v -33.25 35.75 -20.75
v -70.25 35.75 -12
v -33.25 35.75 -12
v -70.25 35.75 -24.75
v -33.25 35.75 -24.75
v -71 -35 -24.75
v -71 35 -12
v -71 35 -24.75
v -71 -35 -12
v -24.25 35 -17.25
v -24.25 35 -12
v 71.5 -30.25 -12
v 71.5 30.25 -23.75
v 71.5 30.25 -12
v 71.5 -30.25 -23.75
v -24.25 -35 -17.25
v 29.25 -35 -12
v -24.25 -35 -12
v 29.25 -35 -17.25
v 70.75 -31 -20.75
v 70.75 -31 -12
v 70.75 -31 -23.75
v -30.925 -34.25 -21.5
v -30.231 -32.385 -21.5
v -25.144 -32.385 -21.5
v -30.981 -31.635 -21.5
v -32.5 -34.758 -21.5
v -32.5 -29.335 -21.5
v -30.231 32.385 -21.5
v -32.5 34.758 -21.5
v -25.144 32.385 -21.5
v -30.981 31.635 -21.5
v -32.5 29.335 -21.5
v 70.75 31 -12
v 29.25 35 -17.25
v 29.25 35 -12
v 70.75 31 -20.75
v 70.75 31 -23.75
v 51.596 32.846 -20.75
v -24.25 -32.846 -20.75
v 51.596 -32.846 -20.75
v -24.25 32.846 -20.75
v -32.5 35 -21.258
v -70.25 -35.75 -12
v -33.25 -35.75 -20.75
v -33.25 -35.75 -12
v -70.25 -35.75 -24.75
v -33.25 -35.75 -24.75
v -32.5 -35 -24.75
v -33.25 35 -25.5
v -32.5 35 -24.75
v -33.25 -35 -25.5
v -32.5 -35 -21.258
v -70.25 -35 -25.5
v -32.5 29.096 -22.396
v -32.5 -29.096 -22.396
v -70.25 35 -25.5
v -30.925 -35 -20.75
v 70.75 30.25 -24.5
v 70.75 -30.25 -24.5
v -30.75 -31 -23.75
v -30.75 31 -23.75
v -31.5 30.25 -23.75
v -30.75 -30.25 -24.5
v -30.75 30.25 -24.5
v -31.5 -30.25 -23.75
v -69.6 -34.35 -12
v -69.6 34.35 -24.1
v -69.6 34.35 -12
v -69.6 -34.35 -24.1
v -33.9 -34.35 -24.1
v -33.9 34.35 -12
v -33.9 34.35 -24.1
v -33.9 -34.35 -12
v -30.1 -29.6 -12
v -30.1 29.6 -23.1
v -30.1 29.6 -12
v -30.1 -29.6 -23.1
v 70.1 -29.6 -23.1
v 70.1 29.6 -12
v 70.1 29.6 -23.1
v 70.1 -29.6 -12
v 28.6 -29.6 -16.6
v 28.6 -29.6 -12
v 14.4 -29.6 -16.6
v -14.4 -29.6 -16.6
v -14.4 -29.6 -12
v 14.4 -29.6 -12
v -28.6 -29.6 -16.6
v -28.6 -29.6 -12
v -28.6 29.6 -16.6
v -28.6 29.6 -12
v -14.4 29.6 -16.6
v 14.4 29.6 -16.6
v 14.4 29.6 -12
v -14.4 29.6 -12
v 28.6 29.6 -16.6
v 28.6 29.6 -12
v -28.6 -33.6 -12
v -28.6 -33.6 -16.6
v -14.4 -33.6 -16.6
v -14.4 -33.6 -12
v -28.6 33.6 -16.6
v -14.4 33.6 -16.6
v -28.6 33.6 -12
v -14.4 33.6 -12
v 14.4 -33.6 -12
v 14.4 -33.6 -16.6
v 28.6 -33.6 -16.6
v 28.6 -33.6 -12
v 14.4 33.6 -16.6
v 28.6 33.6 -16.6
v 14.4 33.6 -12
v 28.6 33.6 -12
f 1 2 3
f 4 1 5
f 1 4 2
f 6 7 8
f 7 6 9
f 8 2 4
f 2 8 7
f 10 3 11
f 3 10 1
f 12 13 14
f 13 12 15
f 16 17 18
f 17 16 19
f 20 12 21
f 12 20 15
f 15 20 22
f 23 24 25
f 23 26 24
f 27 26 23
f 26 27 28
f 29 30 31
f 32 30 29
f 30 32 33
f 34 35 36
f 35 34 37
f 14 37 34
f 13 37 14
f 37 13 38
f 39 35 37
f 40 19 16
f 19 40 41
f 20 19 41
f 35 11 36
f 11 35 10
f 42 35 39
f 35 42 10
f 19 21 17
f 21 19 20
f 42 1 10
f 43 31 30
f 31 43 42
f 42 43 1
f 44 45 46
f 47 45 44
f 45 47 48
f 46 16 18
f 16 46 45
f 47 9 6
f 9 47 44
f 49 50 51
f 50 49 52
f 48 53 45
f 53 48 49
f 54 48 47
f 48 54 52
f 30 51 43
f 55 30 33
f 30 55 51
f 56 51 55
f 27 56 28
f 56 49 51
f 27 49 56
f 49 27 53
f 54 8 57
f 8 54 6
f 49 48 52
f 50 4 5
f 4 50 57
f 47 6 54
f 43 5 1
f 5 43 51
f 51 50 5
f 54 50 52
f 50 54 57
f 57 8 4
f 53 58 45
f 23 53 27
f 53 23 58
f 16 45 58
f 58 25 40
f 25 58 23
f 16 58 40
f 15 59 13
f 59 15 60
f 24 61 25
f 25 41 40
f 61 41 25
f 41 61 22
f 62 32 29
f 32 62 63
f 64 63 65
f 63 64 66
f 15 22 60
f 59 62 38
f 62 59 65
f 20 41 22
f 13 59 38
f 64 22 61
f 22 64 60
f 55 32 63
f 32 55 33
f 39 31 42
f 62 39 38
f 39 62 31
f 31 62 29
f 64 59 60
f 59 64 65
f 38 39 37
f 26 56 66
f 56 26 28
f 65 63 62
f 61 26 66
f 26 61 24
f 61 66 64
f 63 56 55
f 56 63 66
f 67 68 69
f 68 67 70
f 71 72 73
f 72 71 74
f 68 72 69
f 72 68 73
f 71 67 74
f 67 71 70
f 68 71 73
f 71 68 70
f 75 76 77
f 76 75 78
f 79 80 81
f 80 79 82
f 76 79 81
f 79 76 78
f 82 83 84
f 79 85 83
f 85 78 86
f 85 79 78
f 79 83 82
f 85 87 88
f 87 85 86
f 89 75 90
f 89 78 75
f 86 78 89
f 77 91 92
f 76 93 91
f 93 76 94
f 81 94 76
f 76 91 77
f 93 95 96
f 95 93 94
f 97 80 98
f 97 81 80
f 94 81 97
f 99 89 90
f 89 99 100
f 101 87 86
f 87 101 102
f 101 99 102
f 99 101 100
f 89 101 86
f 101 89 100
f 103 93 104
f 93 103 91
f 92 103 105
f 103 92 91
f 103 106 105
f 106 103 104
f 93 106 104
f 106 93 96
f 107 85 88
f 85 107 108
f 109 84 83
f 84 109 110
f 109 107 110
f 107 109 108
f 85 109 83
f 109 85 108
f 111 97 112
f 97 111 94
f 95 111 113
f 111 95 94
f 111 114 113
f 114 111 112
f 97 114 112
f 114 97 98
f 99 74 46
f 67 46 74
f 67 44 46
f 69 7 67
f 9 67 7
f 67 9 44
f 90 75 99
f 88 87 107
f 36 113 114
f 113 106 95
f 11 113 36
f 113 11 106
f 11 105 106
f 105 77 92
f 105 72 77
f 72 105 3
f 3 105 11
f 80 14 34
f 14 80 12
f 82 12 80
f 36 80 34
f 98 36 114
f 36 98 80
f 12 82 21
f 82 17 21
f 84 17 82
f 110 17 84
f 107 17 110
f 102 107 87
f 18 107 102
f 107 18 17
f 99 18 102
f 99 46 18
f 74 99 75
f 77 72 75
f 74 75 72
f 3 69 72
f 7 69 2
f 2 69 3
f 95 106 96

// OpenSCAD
$fs=1;
$fa=1;


display_w=85.5+.5;
display_h=28.5+.5;
display_h_2=33;

border=10;
w=display_w+2*10;
l=display_h+2*10+2*14;

mainboard_w=100;
mainboard_l=59;
mainboard_h=11;
mainboard_x=20;

wall=1.5;

// TODO bei dieser Höhe muss Akku / Mainboard neben den UI-Einheiten liegen?
h=15;

encoder_d=7;

module aa_box()
{
	translate([-35.5/2,0,-22.5/2]) cube([35.5,68.5,22.5],center=true);
}

module aa_cell()
{
	rotate(90,[1,0,0]) color([.3,.3,.7]){
		cylinder(h=49,r=14/2,center=true);
		translate([0,0,-49/2-1/2]) cylinder(h=1,r=2,center=true);
	}
}

module bevel_cube(size,bevel)
{
	hull()
	{
		cube(size-[0,bevel,bevel],center=true);
		cube(size-[bevel,bevel,0],center=true);
		cube(size-[bevel,0,bevel],center=true);
	}
}

module mainboard(inner=true)
{
	translate([mainboard_x,0,-mainboard_h/2]) color([.7,.3,0]) cube([mainboard_w,mainboard_l,mainboard_h],center=true);

	translate([0,43/2,8.5/2]) cube([27,7,8.5],center=true);
	translate([0,-43/2,8.5/2]) cube([27,7,8.5],center=true);
}

module knobs_and_display(inner_only)
{
	translate([0,0,-2+0.1-(inner_only ? wall : -1)]) {
		color([.4,.4,.4]) cube([display_w,display_h,4],center=true);
		if(!inner_only) color([.2,1.,.2]) translate([0,0,5/2]) cube([display_w*.9,display_h*.9,.1],center=true);
	if(!inner_only) translate([0,-2,-6]) cube([display_w,display_h_2,10],center=true);

	}


	
	for(x=[-1,1])
	  for(y=[-1,1])
	    translate([x*display_w/4,y*(display_h/2+24/2),-wall])
		   color([.4,.4,.4]) union(){
				if(!inner_only) cylinder(r=encoder_d/2,h=15);
				translate([0,0,-7.5]) cube([14,14,15],center=true);
			}
}



module meld()
{
	hull() intersection() 
   {
		child(0);
		for (a = [1:$children-1]) child(a);
	}
	for (a = [1:$children-1]) child(a);
}


module inner_right(inner=true)
{
   y=-12;
	cell_y=-0;
	translate([0,0,y]) mainboard();
	knobs_and_display(inner);	
}


module inner_left()
{
   y=-8;
	cell_y=-1;
	// translate([-mainboard_w/2-8-3.1,0,y+cell_y]) aa_cell();
	// translate([-mainboard_w/2-8-18,0,y+cell_y]) aa_cell();
	translate([-mainboard_w/2+mainboard_x-4,0,-wall]) aa_box();
}


module inner_hull()
{
   y=-8;
	cell_y=-0;

   meld() {
		translate([-55,0,0]) cube([60,100,40],center=true);
		hull() inner_left();
		hull() inner_right();
	}
}

module inner()
{
	inner_left();
	inner_right();
}


%knobs_and_display(false);

%inner();

intersection()
{
	//translate([0,0,1000/2-11.5]) cube([1000,1000,1000],center=true);
	translate([0,0,-1000/2-11.5-.5]) cube([1000,1000,1000],center=true);

	difference()
	{	
		minkowski()
		{
			bevel_cube([wall*2,wall*2,wall*2],wall);
			inner_hull();
		}
		minkowski() 
		{
			union(){
				inner_left();
				inner_right(false);
			}
			cube([.2,.2,.2],center=true);
		}
	}

}
